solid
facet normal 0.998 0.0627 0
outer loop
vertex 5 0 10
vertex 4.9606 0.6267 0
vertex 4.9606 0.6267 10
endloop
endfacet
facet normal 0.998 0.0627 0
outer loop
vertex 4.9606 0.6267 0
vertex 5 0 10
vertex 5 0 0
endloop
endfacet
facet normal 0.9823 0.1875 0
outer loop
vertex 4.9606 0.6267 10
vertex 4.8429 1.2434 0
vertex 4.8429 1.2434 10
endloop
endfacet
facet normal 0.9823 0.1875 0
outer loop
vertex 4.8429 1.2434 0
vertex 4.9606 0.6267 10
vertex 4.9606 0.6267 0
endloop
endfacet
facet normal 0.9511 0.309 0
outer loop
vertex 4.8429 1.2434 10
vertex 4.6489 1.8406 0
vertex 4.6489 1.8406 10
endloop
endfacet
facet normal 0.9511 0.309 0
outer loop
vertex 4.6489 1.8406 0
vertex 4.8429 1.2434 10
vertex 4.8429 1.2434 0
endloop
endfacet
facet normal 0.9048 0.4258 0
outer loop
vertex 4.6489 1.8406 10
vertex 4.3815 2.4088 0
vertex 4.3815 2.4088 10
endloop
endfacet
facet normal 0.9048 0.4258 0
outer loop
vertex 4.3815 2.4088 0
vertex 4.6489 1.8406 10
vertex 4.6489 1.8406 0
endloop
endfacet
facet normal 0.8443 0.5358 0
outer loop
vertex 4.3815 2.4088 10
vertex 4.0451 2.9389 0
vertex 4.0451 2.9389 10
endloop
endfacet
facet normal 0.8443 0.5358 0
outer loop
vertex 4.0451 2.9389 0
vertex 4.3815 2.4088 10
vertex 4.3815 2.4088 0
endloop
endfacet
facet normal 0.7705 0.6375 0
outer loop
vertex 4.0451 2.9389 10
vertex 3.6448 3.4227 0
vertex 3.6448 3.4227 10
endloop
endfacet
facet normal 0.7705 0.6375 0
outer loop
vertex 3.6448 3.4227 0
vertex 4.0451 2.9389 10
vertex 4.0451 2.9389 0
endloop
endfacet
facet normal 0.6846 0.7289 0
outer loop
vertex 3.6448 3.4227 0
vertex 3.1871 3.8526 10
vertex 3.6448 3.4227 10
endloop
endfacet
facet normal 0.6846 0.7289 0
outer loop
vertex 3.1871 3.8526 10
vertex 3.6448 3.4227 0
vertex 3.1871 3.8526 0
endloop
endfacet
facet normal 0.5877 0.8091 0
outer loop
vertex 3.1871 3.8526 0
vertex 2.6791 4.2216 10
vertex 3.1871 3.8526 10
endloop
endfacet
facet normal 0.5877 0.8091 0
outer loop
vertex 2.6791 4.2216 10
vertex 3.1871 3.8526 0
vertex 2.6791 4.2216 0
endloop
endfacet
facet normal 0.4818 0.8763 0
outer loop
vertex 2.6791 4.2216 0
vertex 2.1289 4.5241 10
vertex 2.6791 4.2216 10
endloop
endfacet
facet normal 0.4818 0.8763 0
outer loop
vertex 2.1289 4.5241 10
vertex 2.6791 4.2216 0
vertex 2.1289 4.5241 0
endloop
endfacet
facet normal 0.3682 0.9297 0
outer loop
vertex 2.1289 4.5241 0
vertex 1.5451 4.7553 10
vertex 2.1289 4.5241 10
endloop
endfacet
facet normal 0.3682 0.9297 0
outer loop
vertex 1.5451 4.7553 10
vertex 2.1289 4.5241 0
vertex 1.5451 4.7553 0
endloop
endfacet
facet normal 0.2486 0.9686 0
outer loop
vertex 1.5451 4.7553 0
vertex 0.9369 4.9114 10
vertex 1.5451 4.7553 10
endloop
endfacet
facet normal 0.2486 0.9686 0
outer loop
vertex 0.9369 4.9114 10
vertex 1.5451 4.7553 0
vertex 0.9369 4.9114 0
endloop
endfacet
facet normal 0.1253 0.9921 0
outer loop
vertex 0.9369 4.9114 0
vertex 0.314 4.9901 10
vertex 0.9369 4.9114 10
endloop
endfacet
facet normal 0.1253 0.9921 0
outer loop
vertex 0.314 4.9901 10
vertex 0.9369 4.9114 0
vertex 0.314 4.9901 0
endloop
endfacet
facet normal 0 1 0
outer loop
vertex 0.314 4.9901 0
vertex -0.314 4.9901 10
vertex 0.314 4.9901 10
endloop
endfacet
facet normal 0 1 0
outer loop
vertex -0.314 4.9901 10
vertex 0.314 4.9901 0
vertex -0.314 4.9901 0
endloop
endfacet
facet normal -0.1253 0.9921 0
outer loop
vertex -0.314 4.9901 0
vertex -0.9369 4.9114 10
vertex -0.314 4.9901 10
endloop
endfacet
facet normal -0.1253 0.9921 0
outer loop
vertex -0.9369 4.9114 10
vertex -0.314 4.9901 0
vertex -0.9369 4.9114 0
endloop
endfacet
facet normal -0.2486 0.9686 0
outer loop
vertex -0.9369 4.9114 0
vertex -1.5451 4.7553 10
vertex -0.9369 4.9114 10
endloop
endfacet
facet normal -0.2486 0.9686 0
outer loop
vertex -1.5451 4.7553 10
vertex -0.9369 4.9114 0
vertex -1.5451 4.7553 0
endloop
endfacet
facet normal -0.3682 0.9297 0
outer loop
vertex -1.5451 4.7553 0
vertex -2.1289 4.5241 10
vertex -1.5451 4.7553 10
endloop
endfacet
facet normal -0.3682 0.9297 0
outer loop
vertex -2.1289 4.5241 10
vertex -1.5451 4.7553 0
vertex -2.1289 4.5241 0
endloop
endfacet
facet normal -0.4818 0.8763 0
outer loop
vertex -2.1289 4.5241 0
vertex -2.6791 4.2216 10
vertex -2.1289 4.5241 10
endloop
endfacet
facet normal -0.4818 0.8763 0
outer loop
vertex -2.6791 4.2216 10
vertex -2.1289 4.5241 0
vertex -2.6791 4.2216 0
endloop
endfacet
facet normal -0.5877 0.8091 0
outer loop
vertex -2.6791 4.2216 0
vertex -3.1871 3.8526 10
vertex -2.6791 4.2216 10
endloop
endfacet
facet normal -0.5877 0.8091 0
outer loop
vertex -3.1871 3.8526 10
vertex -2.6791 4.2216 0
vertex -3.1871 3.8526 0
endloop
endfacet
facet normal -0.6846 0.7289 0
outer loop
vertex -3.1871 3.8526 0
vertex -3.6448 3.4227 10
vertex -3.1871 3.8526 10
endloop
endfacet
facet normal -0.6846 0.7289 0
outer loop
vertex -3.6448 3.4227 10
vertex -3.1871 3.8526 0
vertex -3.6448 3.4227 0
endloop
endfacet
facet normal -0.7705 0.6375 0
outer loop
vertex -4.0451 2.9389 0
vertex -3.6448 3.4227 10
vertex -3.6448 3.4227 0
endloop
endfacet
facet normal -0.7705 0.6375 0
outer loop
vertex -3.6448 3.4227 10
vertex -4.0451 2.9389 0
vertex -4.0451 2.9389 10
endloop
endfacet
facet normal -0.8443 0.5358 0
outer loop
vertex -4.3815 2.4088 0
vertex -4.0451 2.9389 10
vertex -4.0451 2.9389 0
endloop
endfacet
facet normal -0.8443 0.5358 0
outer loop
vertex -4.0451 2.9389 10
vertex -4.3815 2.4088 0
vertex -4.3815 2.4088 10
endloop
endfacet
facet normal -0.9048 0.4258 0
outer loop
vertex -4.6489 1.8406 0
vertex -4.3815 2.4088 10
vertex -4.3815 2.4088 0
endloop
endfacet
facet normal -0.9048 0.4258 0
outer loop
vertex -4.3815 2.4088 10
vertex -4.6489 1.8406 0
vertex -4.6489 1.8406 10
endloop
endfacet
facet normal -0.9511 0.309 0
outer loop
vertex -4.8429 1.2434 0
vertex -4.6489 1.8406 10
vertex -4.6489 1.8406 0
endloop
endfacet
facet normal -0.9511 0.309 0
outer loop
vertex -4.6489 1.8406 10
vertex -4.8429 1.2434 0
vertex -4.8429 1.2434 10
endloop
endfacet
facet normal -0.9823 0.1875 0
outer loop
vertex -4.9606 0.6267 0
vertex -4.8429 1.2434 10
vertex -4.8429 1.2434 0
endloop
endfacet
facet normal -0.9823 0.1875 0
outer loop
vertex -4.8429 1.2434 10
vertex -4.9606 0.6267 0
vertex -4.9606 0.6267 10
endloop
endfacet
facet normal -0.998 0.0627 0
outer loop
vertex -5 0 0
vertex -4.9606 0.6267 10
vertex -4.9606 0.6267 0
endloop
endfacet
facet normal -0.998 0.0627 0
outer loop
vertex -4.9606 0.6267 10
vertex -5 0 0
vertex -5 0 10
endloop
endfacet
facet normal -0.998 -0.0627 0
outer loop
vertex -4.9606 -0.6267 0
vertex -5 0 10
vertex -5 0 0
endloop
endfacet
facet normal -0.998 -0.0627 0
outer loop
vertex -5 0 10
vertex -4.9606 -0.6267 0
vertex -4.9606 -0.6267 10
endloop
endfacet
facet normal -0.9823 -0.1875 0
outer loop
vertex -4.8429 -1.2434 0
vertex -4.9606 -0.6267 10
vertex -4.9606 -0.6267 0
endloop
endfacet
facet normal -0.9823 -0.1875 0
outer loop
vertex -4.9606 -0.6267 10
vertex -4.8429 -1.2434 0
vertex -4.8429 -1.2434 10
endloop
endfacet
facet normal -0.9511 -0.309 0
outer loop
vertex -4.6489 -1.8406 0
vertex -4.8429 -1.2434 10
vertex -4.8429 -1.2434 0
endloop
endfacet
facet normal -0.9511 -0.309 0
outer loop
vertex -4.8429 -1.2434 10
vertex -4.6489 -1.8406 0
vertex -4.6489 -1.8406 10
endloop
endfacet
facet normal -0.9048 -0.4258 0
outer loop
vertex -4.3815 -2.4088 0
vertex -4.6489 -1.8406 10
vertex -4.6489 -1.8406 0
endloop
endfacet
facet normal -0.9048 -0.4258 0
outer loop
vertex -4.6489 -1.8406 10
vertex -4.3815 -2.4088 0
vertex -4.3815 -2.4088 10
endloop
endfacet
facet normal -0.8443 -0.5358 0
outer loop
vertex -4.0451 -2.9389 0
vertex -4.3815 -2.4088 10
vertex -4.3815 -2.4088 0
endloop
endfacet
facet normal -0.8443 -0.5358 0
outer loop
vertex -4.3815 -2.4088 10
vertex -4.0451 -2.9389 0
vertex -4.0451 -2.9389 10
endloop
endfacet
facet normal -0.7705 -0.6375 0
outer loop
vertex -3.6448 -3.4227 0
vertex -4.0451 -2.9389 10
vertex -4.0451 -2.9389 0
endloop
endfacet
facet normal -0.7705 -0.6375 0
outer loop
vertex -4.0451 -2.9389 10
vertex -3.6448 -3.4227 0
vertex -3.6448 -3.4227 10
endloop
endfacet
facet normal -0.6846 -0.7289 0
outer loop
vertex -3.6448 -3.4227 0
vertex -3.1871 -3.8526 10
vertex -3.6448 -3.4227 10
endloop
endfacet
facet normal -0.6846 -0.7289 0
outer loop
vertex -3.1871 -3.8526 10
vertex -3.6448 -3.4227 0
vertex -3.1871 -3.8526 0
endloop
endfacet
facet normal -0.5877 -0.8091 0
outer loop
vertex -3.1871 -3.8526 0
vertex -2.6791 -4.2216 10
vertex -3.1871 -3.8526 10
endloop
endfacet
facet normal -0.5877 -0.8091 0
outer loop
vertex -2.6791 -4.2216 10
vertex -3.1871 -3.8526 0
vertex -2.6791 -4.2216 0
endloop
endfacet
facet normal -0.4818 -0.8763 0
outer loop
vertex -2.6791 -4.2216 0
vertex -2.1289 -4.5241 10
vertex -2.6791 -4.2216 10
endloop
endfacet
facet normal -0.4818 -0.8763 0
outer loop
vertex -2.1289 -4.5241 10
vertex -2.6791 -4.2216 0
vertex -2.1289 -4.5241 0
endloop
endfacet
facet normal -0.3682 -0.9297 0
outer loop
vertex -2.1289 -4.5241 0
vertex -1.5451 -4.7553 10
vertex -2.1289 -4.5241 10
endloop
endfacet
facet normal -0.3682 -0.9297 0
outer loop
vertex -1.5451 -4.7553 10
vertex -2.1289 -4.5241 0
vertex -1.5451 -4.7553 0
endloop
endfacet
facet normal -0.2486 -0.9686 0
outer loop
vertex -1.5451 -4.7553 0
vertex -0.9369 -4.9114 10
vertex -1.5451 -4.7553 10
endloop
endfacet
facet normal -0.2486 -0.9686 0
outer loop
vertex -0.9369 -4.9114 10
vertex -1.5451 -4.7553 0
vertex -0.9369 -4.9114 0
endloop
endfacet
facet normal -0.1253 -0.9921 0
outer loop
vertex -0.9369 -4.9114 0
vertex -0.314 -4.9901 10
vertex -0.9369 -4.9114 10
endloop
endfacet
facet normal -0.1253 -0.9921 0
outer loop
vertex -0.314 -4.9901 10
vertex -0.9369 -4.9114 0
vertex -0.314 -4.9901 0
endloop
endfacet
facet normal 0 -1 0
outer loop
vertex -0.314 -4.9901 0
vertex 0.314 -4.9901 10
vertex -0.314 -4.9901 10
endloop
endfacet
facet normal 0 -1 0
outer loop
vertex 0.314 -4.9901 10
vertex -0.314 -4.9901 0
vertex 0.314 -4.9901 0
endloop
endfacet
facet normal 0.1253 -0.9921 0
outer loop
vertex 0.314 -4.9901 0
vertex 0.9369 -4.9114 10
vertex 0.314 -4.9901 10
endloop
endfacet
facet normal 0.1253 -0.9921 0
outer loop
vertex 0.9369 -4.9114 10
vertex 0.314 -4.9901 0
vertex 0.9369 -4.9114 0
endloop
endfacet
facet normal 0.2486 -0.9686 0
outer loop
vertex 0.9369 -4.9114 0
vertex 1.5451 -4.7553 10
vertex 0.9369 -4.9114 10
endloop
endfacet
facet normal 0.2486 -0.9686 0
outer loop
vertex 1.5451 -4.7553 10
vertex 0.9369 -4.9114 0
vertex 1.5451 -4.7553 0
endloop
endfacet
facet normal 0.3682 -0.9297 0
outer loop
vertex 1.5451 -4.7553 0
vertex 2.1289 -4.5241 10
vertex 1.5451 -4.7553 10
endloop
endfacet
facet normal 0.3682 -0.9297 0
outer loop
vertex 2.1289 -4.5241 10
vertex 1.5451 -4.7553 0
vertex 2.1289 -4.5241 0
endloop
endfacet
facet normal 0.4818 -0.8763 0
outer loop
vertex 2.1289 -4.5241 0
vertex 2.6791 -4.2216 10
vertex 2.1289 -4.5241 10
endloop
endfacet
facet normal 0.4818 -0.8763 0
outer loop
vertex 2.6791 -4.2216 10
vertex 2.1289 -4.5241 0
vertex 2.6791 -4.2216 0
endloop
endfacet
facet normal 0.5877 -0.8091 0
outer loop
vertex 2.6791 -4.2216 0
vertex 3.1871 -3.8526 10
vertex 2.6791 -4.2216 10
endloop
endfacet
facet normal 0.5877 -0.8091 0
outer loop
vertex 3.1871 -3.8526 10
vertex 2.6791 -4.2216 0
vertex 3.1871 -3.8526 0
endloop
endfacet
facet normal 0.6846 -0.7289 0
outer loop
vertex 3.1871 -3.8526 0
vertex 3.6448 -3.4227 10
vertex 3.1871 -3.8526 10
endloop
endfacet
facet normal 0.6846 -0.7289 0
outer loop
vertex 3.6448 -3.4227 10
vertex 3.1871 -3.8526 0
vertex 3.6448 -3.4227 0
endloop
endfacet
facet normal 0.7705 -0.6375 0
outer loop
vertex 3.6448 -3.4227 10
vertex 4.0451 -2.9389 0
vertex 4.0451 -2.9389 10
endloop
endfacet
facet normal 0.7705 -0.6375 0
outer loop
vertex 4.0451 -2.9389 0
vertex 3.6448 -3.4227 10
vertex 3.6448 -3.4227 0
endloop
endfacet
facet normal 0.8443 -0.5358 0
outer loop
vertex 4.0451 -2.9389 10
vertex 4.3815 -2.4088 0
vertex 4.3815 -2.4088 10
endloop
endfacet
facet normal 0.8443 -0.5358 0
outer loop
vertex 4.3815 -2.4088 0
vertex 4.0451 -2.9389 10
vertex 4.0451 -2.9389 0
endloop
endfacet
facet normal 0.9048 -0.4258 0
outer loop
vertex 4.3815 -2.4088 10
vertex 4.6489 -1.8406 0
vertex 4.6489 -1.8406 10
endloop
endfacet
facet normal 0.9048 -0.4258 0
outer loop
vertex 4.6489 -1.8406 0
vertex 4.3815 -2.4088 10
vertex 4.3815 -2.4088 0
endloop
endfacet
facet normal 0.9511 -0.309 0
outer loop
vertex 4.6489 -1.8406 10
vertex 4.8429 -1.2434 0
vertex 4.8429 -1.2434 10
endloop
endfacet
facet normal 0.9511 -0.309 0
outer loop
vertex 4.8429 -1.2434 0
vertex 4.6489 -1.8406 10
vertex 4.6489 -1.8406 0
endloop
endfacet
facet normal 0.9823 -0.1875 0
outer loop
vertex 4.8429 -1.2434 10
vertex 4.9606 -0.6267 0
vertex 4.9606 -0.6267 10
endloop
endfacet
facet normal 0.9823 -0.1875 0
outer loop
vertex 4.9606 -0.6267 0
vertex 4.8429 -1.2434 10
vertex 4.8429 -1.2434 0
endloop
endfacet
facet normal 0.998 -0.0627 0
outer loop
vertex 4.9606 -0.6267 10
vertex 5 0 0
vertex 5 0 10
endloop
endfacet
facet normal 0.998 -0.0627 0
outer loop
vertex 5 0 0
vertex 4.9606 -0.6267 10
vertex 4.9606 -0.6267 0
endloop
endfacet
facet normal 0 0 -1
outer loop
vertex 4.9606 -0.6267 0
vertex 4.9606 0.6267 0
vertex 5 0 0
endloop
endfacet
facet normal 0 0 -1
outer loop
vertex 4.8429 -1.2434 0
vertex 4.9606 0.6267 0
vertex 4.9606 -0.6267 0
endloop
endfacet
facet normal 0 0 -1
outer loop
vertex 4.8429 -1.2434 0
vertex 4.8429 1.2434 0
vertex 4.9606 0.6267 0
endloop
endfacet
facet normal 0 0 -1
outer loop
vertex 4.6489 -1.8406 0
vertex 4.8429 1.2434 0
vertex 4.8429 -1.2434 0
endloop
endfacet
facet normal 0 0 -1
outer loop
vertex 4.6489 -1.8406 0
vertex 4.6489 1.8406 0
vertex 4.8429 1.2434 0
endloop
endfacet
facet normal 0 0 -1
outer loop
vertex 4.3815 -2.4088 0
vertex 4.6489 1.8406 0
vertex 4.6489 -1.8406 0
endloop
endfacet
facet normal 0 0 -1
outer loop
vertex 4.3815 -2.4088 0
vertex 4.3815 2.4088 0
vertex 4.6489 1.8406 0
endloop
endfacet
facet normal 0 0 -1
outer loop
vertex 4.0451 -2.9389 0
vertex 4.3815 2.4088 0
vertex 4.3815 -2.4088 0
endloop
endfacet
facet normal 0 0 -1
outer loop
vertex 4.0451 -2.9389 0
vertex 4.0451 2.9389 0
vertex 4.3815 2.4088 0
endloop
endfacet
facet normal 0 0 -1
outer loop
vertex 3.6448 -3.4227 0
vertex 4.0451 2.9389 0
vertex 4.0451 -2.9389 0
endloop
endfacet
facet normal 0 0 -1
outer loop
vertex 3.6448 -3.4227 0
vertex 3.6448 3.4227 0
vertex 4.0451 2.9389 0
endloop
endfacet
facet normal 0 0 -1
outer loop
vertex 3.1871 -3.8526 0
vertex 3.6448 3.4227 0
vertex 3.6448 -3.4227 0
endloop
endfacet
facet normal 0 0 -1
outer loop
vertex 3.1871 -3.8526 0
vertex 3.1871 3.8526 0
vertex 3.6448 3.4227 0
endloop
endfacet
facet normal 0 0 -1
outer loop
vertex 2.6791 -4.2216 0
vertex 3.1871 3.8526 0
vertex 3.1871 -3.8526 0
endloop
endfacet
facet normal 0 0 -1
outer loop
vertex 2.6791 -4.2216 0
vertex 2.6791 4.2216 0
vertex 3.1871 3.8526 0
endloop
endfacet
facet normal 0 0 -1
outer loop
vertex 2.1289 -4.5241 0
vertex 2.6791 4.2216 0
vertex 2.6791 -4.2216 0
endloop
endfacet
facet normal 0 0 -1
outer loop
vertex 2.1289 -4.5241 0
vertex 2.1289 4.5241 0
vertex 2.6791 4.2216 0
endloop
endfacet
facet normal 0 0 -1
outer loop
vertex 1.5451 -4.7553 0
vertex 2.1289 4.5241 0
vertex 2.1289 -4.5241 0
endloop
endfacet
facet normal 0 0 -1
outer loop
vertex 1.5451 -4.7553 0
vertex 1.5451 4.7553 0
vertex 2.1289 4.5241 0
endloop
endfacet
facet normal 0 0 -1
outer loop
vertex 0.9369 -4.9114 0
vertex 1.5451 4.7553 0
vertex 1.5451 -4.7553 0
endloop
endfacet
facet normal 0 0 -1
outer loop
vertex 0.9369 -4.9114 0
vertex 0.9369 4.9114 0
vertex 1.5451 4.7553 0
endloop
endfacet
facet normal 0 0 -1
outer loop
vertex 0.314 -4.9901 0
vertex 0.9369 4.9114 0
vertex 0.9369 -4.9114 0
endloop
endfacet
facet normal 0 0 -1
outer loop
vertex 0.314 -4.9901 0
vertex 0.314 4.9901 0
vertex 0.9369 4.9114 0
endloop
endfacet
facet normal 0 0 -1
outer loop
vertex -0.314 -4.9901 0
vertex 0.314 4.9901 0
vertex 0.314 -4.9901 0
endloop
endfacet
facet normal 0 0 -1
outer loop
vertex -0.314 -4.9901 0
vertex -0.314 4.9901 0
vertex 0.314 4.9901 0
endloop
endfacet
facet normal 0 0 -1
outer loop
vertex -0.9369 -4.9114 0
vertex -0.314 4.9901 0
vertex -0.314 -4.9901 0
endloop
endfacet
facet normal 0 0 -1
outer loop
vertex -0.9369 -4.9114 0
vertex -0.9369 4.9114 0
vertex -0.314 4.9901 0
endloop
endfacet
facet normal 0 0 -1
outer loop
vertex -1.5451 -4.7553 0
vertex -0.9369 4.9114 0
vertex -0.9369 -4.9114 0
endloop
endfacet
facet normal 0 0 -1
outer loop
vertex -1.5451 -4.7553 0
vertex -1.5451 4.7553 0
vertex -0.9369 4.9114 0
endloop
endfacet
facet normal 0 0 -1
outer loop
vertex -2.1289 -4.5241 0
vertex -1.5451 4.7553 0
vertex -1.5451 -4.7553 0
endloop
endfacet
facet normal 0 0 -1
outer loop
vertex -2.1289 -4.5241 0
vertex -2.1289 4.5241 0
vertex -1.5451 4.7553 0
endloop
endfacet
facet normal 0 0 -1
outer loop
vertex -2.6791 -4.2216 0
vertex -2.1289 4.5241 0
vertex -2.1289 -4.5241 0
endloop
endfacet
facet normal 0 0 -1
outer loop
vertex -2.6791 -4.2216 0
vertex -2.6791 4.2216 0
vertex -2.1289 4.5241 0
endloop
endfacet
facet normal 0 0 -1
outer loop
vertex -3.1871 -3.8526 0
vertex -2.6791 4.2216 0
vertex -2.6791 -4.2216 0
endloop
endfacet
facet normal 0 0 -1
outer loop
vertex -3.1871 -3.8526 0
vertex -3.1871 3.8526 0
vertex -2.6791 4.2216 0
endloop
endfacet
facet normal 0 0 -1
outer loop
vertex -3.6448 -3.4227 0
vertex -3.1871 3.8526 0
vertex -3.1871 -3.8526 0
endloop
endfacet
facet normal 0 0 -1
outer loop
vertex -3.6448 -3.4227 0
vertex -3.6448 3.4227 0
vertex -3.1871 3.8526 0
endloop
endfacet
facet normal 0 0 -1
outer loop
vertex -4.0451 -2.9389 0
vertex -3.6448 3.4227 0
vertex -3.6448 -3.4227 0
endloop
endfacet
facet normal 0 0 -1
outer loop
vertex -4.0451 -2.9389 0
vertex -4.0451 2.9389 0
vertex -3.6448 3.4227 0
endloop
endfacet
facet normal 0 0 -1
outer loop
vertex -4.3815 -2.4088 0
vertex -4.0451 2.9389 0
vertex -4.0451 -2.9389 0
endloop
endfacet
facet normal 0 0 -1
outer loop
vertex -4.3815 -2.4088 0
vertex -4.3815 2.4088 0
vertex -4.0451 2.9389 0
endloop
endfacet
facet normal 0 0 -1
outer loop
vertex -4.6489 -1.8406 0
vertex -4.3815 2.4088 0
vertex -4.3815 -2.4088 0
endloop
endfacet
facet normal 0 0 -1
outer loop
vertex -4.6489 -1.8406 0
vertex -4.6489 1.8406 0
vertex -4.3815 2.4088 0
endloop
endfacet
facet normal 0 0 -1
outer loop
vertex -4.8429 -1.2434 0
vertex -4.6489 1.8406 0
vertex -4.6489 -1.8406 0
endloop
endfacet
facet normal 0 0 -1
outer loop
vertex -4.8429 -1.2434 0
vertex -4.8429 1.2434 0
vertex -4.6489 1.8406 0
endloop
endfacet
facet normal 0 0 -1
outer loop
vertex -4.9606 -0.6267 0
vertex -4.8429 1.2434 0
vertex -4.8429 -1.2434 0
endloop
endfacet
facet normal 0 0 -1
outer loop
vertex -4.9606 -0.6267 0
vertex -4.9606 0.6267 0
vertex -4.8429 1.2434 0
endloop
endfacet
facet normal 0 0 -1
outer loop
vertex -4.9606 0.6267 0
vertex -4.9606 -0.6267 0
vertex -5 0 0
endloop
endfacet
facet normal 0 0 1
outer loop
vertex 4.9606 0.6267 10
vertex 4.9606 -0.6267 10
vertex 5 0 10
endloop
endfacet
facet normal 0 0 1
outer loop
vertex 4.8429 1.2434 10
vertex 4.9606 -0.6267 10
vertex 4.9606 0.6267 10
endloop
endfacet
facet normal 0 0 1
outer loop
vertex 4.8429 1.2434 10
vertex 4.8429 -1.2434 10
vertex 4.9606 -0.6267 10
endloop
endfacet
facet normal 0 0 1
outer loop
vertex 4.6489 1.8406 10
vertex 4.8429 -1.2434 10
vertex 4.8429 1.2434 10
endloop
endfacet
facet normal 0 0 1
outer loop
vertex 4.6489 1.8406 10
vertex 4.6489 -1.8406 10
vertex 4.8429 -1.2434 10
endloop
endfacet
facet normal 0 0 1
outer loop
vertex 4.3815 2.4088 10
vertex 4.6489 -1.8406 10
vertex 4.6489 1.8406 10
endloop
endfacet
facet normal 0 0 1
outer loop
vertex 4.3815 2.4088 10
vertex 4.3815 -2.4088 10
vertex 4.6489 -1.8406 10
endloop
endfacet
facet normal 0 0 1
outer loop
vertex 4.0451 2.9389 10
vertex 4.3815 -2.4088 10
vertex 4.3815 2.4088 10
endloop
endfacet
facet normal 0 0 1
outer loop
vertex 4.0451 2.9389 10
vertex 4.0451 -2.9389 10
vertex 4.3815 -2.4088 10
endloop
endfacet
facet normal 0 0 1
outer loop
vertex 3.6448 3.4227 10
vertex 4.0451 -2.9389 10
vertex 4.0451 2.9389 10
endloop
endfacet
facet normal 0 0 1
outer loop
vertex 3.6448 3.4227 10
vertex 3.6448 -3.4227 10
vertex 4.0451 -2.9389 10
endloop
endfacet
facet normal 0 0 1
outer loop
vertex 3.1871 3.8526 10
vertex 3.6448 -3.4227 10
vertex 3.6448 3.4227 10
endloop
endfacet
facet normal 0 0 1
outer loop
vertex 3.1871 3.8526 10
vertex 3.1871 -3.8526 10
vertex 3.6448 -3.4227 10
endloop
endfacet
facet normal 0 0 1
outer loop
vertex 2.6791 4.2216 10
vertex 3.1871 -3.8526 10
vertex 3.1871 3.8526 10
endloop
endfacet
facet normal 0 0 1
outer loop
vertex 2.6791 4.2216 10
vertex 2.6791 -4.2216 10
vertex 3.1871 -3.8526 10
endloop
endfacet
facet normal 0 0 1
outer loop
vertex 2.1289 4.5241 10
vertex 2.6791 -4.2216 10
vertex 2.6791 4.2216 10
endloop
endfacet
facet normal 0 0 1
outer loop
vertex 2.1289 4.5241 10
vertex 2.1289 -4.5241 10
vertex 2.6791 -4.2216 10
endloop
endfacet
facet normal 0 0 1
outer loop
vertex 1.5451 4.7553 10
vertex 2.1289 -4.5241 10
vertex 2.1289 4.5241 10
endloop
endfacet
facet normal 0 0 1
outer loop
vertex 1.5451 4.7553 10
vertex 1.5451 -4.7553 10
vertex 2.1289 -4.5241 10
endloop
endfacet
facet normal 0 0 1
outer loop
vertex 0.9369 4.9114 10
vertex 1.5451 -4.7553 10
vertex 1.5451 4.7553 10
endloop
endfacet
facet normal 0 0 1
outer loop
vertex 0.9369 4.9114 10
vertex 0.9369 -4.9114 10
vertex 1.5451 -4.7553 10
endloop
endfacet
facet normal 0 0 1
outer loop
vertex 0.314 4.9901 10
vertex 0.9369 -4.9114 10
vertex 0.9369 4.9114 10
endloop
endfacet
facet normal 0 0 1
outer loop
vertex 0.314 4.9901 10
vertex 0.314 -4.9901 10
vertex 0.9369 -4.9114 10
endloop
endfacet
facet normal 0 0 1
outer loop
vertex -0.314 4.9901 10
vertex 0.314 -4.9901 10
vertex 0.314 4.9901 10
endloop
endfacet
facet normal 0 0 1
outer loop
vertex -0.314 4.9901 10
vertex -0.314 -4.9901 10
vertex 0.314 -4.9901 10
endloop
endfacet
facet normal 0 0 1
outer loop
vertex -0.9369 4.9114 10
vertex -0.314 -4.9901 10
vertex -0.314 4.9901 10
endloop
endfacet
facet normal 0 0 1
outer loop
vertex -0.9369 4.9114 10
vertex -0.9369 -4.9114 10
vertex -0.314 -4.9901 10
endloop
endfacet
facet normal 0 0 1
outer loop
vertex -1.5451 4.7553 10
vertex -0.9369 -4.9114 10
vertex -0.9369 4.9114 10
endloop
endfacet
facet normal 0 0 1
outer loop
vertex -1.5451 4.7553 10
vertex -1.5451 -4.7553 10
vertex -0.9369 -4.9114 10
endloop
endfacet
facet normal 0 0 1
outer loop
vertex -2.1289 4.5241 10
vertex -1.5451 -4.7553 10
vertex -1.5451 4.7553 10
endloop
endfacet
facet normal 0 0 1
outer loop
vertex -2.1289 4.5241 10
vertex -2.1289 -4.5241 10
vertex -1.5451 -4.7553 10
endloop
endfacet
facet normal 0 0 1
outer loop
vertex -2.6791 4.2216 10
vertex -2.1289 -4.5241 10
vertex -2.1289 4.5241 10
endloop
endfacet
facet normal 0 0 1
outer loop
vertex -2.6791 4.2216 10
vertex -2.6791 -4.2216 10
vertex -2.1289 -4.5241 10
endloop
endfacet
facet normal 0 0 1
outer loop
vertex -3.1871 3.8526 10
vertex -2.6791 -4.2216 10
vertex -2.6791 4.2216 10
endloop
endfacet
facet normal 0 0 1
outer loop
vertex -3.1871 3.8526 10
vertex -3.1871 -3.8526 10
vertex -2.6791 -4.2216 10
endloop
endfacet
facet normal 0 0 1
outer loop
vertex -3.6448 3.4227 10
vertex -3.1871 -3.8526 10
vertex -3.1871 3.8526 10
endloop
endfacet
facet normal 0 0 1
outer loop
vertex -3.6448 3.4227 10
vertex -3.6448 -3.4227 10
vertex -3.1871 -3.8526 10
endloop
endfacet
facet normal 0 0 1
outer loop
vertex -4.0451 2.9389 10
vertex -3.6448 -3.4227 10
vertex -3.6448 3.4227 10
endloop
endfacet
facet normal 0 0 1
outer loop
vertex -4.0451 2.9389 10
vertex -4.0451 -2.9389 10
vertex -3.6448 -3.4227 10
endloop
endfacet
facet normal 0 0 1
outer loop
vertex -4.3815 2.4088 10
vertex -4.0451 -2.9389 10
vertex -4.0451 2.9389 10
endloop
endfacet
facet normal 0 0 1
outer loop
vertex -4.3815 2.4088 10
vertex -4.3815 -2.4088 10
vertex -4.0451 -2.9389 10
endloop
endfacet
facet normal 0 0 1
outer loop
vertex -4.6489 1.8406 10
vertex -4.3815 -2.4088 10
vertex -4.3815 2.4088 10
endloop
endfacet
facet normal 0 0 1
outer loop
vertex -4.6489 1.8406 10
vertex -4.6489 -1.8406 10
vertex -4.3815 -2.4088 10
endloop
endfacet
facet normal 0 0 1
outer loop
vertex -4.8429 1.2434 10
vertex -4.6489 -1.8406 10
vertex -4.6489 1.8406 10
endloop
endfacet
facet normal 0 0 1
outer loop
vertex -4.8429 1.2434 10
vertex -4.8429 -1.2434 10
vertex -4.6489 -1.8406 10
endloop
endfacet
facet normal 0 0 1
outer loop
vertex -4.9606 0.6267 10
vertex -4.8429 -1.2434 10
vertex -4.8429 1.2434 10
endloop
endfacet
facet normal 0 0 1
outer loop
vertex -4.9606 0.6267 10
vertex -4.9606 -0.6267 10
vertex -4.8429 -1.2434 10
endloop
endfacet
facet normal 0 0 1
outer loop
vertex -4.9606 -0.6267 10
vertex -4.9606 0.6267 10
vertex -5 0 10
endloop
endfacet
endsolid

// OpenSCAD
// Generated by SolidPython 0.4.7 on 2020-04-13 18:19:41


cylinder($fn = 50, h = 10, r = 5);
/***********************************************
*********      SolidPython code:      **********
************************************************
 
from solid import *
from solid.utils import *
d = cylinder(r=5,h=10)
d.add_param('$fn',50)

scad_render_to_file(d,"tube.scad")
 
 
************************************************/
